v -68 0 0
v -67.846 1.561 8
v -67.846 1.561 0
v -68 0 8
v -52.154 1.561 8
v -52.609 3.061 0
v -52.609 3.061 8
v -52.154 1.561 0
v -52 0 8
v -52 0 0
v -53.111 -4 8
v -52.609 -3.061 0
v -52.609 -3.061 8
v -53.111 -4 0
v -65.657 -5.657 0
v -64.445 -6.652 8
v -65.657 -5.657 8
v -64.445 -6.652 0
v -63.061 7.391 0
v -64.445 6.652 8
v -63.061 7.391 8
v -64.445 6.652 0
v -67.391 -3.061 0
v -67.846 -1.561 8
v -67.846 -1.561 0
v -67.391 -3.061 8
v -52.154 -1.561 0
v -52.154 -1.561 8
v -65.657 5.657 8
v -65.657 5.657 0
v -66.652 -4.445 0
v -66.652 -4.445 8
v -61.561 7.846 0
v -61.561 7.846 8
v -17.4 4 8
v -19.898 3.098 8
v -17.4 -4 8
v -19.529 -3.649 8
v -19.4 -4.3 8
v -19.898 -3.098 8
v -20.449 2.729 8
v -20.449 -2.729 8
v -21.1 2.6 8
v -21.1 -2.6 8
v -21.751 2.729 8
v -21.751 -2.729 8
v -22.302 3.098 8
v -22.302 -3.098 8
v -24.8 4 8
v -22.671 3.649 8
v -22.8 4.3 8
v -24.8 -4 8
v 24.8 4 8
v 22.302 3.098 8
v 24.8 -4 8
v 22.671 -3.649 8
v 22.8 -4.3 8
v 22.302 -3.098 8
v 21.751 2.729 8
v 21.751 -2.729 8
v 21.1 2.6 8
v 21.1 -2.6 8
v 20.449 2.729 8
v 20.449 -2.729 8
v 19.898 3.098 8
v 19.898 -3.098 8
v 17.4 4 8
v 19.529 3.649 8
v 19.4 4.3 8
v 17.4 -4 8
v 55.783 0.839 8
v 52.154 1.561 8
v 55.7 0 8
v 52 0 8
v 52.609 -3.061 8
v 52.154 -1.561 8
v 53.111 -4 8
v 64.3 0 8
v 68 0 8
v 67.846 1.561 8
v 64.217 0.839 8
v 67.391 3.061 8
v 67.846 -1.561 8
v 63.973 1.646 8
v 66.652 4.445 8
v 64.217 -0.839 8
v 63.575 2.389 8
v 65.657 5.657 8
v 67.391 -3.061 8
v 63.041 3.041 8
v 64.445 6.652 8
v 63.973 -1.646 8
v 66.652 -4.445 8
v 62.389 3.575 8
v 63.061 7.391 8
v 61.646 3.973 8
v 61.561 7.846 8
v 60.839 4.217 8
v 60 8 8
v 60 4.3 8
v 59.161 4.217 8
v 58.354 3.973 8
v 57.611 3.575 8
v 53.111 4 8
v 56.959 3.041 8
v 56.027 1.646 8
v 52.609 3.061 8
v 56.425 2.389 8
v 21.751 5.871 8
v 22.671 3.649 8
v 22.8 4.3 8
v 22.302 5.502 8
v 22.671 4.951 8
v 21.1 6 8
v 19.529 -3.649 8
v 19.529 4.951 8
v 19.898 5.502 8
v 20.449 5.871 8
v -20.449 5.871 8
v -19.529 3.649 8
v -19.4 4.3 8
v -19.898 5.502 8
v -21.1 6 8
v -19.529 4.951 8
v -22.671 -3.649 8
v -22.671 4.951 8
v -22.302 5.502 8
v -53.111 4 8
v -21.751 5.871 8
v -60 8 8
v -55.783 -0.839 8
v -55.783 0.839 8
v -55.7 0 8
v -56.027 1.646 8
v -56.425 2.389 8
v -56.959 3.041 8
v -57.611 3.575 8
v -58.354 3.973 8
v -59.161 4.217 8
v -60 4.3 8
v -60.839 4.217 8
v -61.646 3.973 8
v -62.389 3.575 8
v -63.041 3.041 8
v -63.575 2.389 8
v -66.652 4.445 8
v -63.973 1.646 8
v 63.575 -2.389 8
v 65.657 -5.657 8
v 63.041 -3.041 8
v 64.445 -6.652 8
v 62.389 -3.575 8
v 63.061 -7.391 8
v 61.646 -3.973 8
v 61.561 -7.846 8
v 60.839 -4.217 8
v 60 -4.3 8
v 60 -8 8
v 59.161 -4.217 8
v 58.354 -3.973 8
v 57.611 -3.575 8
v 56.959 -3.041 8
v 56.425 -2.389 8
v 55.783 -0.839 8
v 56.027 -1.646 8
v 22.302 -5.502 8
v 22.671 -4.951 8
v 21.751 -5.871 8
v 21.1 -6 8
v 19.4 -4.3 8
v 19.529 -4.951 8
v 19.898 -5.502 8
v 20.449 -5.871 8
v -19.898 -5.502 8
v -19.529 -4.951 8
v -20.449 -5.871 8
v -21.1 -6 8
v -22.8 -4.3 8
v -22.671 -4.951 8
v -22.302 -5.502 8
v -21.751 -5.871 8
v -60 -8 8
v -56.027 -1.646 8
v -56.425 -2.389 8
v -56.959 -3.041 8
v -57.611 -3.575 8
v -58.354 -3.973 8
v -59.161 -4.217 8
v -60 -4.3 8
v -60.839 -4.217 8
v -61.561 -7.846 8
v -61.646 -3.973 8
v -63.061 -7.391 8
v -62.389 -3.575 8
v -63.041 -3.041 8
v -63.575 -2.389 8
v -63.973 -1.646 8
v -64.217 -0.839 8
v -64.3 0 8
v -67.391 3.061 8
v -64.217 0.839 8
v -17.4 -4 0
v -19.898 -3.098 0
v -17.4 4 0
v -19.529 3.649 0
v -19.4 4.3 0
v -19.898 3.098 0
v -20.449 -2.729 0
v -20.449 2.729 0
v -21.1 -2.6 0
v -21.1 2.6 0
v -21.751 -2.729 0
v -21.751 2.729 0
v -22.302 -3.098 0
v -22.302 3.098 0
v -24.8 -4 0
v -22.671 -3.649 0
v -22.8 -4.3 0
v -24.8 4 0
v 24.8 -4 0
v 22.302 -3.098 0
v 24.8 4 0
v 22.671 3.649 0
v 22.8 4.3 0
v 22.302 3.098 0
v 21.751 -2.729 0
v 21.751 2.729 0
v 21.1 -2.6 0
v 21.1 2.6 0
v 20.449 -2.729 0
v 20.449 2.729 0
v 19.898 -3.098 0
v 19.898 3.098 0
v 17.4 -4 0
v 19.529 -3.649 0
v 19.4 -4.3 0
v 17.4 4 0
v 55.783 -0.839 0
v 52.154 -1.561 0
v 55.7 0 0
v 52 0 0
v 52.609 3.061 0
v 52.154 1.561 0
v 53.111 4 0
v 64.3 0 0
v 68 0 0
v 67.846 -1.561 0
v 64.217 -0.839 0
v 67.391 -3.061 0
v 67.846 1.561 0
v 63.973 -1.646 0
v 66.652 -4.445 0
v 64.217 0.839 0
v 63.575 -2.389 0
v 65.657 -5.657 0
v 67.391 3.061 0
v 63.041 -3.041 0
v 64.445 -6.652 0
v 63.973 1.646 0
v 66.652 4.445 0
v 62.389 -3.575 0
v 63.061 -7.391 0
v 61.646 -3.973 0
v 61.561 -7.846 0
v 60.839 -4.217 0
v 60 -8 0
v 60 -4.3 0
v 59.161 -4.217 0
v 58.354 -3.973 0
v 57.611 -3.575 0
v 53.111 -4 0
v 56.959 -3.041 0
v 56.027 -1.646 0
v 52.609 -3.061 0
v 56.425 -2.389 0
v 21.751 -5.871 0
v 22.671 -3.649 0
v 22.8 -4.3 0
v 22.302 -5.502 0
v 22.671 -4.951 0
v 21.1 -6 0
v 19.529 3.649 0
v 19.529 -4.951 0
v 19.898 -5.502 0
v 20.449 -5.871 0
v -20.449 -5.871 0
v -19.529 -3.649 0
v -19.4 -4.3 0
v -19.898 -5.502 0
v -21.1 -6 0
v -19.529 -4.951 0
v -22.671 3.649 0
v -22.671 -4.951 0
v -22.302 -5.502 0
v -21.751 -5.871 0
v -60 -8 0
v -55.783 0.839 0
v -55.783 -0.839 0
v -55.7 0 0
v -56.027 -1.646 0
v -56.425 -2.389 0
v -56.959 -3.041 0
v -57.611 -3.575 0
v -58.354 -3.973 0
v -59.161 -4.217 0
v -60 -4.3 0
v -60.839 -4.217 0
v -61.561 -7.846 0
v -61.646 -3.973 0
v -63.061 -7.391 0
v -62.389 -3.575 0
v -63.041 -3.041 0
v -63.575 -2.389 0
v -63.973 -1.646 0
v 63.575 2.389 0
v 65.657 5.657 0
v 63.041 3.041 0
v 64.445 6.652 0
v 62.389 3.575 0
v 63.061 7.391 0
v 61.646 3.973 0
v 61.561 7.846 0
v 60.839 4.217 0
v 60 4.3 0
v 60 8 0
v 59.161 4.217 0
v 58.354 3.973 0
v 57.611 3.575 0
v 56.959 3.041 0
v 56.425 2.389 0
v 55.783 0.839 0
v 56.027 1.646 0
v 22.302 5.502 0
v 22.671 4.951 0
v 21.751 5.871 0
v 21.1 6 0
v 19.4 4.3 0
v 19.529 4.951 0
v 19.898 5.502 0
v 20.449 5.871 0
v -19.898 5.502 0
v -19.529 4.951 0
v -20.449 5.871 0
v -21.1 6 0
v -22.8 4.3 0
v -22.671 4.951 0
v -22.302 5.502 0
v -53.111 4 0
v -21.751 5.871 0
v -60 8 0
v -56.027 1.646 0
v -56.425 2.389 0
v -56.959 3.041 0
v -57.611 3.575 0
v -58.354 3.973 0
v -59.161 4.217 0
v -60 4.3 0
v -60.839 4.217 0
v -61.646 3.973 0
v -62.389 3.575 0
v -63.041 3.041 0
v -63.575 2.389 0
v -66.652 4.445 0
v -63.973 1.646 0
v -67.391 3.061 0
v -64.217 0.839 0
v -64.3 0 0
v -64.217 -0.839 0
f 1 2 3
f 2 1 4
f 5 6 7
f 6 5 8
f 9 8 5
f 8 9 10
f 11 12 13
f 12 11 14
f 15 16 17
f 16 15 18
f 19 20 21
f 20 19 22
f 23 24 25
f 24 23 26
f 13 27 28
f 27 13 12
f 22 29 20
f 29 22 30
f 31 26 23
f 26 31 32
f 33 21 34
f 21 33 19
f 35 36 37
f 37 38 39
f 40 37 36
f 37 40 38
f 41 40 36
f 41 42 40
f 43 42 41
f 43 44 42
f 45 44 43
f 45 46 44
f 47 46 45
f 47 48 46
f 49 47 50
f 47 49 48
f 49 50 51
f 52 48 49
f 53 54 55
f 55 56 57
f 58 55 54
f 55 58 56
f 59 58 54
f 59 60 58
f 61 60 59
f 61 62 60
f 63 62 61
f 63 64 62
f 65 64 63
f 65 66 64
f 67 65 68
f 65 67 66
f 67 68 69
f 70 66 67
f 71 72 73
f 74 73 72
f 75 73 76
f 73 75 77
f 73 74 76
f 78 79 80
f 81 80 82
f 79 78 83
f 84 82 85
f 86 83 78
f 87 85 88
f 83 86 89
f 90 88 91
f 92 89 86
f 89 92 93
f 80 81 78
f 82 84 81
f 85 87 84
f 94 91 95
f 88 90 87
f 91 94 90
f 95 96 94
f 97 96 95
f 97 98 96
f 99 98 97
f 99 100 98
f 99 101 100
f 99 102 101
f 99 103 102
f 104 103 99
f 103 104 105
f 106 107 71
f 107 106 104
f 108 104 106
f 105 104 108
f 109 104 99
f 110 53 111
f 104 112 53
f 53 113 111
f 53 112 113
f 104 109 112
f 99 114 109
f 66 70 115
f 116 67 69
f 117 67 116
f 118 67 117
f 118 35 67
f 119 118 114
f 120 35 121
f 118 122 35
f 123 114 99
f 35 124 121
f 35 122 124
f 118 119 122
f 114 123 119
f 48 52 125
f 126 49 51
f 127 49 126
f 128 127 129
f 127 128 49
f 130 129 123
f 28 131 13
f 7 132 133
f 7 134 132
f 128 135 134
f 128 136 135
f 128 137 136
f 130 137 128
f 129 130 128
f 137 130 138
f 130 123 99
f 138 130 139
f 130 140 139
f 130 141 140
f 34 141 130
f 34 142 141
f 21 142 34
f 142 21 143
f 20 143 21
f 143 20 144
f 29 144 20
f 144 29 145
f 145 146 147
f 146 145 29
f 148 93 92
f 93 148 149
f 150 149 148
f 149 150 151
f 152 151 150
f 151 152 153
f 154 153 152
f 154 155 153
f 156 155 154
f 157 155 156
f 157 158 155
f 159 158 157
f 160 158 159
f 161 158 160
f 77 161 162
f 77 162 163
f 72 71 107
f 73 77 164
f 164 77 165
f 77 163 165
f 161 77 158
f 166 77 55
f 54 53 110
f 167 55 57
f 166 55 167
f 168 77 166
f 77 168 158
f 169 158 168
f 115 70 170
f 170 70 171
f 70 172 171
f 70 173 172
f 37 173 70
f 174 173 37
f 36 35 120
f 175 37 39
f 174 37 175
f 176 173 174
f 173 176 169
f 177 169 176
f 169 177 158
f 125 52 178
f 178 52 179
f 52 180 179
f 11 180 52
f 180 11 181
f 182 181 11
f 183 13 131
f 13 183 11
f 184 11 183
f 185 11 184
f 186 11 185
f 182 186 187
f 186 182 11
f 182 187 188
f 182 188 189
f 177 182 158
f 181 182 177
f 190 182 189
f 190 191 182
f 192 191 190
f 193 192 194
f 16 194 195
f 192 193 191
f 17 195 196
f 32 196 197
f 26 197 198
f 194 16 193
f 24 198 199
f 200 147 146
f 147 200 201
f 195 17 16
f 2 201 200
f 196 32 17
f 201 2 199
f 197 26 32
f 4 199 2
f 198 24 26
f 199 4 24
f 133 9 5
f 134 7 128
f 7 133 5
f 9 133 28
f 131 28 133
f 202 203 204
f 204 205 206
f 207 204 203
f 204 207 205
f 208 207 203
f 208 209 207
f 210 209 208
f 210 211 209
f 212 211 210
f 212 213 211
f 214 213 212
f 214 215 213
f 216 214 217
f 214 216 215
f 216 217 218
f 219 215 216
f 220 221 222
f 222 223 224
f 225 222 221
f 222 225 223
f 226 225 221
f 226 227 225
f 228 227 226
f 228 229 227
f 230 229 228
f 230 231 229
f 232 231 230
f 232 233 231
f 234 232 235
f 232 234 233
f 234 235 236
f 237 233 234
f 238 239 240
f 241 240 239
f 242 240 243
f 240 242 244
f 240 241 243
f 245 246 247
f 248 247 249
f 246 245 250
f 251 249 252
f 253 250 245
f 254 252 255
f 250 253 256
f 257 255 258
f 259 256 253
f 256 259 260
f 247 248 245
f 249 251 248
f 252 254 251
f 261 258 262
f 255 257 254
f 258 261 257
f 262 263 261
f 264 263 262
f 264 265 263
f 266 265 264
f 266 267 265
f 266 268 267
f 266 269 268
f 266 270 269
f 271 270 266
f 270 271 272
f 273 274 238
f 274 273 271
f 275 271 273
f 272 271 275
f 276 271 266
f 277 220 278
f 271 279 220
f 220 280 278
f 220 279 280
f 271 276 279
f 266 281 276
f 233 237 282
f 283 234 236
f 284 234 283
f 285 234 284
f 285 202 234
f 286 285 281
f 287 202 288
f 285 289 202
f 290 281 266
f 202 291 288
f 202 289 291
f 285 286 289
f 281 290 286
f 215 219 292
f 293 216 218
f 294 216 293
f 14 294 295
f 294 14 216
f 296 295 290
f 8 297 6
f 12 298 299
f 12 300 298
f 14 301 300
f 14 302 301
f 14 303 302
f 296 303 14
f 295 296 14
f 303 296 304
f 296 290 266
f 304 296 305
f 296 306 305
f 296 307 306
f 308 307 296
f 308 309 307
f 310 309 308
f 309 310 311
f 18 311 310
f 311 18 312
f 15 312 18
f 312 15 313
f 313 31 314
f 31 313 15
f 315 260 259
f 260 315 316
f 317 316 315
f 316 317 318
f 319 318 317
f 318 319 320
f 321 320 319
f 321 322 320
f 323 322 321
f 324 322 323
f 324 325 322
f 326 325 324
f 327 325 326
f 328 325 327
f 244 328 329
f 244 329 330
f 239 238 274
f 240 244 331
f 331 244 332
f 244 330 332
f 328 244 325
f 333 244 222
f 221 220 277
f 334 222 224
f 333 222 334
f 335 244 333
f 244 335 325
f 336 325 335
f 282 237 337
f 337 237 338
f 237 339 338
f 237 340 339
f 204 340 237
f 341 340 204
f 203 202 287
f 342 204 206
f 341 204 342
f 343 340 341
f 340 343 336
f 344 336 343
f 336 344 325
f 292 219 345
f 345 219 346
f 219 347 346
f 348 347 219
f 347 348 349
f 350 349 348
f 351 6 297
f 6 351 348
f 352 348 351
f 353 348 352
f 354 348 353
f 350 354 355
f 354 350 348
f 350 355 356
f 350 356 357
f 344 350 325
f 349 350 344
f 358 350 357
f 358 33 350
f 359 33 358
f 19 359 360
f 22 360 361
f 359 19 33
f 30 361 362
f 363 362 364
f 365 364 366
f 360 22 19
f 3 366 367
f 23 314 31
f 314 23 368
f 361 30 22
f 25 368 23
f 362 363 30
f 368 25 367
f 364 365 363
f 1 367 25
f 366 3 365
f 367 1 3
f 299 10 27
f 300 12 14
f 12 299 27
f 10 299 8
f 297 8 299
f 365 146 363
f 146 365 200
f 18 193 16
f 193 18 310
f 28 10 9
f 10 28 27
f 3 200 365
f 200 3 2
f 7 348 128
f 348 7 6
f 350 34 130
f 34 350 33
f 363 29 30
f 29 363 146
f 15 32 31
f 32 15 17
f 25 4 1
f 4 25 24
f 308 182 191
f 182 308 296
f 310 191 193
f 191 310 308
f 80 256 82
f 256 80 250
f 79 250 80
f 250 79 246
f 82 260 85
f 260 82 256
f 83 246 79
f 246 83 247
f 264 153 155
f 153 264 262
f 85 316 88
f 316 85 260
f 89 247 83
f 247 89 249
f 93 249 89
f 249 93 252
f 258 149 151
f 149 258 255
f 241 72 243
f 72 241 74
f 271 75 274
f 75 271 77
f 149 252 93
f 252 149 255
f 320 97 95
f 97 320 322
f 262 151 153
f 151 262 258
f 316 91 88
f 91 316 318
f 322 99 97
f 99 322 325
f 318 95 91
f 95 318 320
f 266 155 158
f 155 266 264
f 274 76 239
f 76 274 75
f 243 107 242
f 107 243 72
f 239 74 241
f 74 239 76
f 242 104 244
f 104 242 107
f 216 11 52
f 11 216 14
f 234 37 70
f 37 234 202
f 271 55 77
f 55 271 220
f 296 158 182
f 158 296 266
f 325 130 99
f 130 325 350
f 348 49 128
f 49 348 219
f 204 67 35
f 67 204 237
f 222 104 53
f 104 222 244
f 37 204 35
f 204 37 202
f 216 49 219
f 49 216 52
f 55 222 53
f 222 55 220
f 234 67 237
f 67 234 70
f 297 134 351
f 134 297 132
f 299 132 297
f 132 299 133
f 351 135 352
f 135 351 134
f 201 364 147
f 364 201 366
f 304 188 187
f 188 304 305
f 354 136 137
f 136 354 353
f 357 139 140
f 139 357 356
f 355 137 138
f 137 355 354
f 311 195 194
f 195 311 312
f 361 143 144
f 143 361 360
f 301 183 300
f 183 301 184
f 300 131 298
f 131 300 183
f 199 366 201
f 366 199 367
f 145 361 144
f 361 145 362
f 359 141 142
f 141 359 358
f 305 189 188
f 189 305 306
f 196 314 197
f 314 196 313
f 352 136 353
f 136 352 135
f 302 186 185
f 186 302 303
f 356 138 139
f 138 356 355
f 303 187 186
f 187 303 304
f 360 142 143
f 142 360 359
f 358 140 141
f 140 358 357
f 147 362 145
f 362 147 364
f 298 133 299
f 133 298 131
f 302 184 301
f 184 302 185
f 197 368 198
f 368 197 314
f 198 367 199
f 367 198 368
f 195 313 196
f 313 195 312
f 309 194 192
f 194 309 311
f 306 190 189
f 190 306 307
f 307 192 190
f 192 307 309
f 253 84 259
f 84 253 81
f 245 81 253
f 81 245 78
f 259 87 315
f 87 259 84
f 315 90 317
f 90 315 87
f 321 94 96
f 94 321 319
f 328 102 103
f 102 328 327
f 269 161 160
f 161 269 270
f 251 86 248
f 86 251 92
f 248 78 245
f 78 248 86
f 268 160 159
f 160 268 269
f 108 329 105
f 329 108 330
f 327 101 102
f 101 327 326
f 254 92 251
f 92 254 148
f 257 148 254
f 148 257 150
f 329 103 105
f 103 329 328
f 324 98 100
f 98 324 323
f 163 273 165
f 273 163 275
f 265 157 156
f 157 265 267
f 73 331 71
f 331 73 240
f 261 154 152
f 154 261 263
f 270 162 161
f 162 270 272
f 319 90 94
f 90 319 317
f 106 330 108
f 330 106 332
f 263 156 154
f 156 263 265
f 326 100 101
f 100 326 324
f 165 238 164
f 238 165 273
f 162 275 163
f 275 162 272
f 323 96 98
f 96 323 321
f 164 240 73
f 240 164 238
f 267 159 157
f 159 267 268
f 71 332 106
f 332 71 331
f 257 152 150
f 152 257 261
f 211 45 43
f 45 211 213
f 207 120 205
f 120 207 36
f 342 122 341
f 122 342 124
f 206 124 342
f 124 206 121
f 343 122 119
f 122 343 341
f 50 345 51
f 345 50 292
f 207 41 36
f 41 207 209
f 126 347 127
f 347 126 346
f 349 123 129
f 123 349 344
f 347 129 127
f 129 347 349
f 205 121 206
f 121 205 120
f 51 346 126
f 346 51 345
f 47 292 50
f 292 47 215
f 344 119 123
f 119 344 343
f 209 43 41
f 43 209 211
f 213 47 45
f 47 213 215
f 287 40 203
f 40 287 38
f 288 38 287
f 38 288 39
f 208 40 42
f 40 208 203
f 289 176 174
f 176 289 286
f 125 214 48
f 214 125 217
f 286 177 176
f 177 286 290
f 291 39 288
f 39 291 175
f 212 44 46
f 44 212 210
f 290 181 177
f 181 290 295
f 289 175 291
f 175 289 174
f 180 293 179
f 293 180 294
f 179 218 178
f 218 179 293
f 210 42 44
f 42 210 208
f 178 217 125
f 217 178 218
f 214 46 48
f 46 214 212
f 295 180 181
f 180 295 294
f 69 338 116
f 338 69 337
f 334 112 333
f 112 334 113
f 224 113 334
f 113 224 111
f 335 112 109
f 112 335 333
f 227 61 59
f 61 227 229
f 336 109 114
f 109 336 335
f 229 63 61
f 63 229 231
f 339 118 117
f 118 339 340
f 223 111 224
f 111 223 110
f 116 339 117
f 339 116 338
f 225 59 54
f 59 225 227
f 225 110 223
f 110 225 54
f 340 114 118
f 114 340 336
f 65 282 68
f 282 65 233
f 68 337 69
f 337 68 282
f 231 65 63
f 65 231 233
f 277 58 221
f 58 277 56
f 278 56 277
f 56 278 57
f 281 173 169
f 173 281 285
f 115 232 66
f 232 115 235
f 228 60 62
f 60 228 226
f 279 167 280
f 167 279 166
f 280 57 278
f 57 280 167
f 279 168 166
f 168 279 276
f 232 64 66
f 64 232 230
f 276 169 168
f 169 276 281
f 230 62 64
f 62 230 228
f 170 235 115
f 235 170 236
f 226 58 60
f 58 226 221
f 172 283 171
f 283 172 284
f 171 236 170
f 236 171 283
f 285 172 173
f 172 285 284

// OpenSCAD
// file: SpoolholderVars.scad
screwM3Diameter=3+0.4;
screwM3HolderDiameter=screwM3Diameter+2*2;
screwM3HolderRadius=screwM3HolderDiameter/2;
nutM3Height=2;
screw16M3Height=16;
screw30M3Height=30;

rodM8Diameter=8+0.6;
nutM8Diameter=14.4+1.2;
nutM8Height=6.4+1.0;

nutM8HolderDiameter=nutM8Diameter+2*3;
nutM8HolderRadius=nutM8HolderDiameter/2;


length=120;
bottomHeight=10;
topHeight=8;
topWidth=16;
connectorThickness=4;
bottomNutM8HoleHeight=nutM8Height+1.0;


bearingDiameter=28+0.8;
bearingHolderWallThickness=3;
bearingHolderDiameter=bearingDiameter+2*bearingHolderWallThickness;
bearingHolderRadius=bearingHolderDiameter/2;

bearingHolderLength=bearingHolderDiameter+2*screwM3HolderDiameter;
bearingHolderHoleDiameter=18;
bearingHolderBottomHeight=4;
bearingHolderScrewOffset=(bearingHolderLength-screwM3HolderDiameter)/2;
bearingHolderScrewHolderHeight=screw16M3Height-nutM3Height-topHeight;


coneHeight=5;
coneBigDiameter=56;
coneBigRadius=coneBigDiameter/2;
coneSmallDiameter=48;
coneSmallRadius=coneSmallDiameter/2;

coneNutHolderHoleDiameter=16;
coneNutHolderHoleRadius=coneNutHolderHoleDiameter/2;
coneNutHolderWallThickness=4;
coneNutHolderWithWallDiameter=coneNutHolderHoleDiameter+2*coneNutHolderWallThickness;
coneNutHolderScrewOffset=coneNutHolderHoleRadius+screwM3HolderRadius;
coneNutHolderBottomHeight=3;
coneNutHolderTotalHeight=screw30M3Height-nutM3Height-coneHeight;
coneNutHolderNutM8HoleHeight=nutM8Height-1.0;
// main file
include <SpoolholderVars.scad>

difference()
{
	union()
	{
		//Vertical nut holders (cylinders):
		for(t=[-1,1])
		{
			translate([t*length/2,0,0])
			cylinder(d=topWidth,h=topHeight,$fn=32);
		}
		
		//Connectors:
		for(t=[[-1,0],[1,1]])
		{
			y=t[0]*topWidth/2-t[1]*connectorThickness;
			
			translate([-length/2,y,0])
			cube([length,connectorThickness,topHeight]);
		}
		
		//Holders for M3 screws:
		for(t=[-1,1])
		{
			x=t*bearingHolderScrewOffset-screwM3HolderRadius;
			
			translate([x,-topWidth/2,0])
			cube([screwM3HolderDiameter,topWidth,topHeight]);
		}
	}
	
	//Holes for M8 rod:
	for(t=[-1,1])
	{
		translate([t*length/2,0,-1])
		cylinder(d=rodM8Diameter,h=topHeight+2,$fn=32);
	}
	
	//Holes for M3 screws:
	for(t=[[-1,1],[-1,-1],[1,1],[1,-1]])
	{
		x=t[0]*bearingHolderScrewOffset;
		y=t[1]*(topWidth-screwM3HolderDiameter)/2;
		
		translate([x,y,-1])
		cylinder(d=screwM3Diameter,h=topHeight+2,$fn=16);
	}
}
